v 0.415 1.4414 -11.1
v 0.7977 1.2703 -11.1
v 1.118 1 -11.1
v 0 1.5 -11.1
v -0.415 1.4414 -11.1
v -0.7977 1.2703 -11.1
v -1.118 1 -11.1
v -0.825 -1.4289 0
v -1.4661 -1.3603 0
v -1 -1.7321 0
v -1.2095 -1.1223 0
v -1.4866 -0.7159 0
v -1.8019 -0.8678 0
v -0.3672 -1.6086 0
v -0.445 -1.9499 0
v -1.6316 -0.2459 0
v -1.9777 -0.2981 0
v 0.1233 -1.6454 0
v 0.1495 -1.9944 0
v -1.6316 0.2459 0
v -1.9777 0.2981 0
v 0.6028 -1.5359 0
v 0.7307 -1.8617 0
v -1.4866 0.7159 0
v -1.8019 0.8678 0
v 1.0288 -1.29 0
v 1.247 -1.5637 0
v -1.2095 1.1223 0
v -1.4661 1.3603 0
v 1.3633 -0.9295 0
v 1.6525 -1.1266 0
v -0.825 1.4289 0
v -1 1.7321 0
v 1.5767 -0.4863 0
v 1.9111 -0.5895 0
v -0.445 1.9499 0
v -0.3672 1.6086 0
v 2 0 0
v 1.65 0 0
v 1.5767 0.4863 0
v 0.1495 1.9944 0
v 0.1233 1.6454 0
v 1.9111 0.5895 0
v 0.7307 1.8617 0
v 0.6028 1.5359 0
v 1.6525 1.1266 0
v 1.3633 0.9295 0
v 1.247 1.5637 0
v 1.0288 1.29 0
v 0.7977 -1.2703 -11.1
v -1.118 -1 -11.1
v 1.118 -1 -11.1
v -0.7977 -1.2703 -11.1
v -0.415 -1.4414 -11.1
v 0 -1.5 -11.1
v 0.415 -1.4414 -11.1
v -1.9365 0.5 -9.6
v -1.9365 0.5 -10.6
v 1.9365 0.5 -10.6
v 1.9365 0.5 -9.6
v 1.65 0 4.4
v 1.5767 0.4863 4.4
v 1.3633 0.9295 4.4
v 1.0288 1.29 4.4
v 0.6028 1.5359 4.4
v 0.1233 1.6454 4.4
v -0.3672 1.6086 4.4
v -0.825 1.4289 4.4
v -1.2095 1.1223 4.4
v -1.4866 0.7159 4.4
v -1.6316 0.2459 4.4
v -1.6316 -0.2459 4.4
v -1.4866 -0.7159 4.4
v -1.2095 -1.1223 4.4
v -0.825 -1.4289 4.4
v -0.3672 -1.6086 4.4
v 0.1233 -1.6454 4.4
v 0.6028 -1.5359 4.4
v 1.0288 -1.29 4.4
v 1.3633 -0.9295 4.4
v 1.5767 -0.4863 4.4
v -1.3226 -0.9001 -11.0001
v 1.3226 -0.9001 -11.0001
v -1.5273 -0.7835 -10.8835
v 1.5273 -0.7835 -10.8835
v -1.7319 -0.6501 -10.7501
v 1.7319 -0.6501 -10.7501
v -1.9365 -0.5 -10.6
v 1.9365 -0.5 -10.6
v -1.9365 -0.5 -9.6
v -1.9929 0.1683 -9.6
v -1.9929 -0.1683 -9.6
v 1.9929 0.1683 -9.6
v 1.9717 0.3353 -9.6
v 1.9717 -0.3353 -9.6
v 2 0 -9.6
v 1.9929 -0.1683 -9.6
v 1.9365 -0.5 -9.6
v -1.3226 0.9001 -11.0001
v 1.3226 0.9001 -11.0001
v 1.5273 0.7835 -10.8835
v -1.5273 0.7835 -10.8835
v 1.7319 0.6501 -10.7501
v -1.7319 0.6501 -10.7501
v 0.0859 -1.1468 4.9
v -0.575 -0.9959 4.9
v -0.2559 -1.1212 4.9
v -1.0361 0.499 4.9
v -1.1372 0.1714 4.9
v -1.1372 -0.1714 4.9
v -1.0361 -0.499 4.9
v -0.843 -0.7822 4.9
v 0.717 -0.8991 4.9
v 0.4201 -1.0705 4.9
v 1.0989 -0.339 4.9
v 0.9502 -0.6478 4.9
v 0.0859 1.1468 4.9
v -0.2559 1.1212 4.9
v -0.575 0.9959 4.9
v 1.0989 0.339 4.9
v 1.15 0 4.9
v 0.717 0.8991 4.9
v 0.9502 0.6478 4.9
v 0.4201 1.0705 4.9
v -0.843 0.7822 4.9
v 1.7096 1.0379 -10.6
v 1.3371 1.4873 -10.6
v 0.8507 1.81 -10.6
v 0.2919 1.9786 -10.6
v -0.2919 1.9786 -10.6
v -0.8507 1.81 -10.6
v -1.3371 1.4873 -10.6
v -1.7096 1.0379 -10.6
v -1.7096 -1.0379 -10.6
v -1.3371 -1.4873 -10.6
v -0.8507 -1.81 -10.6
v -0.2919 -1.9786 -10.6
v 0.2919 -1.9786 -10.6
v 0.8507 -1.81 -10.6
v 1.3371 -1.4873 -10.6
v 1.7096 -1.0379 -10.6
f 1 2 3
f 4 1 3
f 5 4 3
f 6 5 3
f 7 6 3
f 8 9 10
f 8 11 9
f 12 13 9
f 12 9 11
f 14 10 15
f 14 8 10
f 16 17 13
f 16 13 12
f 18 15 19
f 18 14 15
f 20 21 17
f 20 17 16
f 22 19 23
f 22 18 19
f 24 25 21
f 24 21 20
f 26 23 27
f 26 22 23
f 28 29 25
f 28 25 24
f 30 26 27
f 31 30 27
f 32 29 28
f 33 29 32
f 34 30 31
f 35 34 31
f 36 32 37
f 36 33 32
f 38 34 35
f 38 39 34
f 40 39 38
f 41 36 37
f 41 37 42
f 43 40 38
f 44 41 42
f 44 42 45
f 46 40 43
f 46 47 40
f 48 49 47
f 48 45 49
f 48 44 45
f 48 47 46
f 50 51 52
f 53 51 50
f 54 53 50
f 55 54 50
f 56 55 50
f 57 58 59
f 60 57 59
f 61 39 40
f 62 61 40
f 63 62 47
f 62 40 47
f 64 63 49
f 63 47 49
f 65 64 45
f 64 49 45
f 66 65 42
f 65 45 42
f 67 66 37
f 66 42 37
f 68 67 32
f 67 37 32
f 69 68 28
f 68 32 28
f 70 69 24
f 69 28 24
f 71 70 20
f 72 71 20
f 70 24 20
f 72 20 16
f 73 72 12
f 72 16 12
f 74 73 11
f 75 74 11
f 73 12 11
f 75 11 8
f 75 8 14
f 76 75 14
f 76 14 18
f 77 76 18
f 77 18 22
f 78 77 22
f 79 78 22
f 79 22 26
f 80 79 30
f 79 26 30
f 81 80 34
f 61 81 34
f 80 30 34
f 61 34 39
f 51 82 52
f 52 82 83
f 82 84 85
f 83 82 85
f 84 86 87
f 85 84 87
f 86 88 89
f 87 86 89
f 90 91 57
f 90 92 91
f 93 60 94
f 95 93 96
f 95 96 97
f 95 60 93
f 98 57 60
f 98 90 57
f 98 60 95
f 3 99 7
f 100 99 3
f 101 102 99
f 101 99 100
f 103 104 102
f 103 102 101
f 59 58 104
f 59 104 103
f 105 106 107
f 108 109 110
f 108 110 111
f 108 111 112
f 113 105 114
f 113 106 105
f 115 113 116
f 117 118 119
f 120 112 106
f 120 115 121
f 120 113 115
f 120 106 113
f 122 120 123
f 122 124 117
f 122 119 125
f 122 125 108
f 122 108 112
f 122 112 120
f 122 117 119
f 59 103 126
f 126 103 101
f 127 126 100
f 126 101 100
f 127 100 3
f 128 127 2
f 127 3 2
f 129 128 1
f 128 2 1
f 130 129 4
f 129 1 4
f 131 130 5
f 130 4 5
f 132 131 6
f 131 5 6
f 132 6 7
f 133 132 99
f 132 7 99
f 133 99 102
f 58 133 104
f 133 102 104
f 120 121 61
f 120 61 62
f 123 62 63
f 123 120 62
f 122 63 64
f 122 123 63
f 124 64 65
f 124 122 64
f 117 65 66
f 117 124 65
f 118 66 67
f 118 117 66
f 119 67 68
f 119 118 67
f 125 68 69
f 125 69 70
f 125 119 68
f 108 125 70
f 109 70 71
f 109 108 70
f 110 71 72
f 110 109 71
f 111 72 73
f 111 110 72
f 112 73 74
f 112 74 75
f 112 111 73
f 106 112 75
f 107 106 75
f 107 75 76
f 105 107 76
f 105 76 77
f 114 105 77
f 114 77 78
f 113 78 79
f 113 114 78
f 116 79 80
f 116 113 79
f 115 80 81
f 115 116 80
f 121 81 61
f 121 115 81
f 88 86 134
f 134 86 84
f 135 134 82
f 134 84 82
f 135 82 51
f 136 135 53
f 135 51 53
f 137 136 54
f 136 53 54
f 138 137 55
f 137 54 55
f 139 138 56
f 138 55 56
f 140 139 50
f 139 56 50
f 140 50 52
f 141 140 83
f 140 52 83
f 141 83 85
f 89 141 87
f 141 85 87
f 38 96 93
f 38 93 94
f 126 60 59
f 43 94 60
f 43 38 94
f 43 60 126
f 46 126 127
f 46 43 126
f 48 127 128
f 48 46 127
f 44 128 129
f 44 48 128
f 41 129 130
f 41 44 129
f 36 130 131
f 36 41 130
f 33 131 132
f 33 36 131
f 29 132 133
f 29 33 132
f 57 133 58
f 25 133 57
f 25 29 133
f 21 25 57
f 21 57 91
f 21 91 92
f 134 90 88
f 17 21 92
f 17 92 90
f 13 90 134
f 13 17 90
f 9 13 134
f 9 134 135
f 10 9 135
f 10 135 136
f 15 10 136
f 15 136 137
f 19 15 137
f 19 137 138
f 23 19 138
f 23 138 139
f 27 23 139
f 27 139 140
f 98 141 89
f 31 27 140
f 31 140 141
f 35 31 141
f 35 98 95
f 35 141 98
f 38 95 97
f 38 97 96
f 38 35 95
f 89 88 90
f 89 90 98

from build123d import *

# Parameters (mm, degrees)
F0_R     = 1.65
F1_DEPTH = 4.9
F0_R_2   = 2
F2_DEPTH = 11.1
F3_SIZE  = 0.5
F4_W     = 4
F4_H     = 1
F5_DEPTH = 1.5
F6_SIZE  = 0.5


with BuildPart() as f1:
    # F0 (on Top) → F1 (new body)
    with BuildSketch(Plane.XY):
        Circle(F0_R)
    extrude(amount=F1_DEPTH)

    # F0 (on Top) → F2 (join)
    with BuildSketch(Plane.XY):
        Circle(F0_R_2)
        Circle(F0_R, mode=Mode.SUBTRACT)
        Circle(F0_R)
    extrude(amount=-F2_DEPTH)

    # F3
    f3_edges = [f1.edges().sort_by_distance(p)[0] for p in [
        (-1.65, 0, 4.9),
        (-2, 0, -11.1),
    ]]
    chamfer(f3_edges, length=F3_SIZE)

    # F4 (on face) → F5 (cut)
    with BuildSketch(Plane(origin=(0, 0, -11.1), x_dir=(1, 0, 0), z_dir=(0, 0, -1))):
        Rectangle(F4_W, F4_H)
    extrude(amount=-F5_DEPTH, mode=Mode.SUBTRACT)

    # F6
    f6_edges = [f1.edges().sort_by_distance(p)[0] for p in [
        (0, 0.5, -11.1),
        (0, -0.5, -11.1),
    ]]
    chamfer(f6_edges, length=F6_SIZE)


solid = f1.part
